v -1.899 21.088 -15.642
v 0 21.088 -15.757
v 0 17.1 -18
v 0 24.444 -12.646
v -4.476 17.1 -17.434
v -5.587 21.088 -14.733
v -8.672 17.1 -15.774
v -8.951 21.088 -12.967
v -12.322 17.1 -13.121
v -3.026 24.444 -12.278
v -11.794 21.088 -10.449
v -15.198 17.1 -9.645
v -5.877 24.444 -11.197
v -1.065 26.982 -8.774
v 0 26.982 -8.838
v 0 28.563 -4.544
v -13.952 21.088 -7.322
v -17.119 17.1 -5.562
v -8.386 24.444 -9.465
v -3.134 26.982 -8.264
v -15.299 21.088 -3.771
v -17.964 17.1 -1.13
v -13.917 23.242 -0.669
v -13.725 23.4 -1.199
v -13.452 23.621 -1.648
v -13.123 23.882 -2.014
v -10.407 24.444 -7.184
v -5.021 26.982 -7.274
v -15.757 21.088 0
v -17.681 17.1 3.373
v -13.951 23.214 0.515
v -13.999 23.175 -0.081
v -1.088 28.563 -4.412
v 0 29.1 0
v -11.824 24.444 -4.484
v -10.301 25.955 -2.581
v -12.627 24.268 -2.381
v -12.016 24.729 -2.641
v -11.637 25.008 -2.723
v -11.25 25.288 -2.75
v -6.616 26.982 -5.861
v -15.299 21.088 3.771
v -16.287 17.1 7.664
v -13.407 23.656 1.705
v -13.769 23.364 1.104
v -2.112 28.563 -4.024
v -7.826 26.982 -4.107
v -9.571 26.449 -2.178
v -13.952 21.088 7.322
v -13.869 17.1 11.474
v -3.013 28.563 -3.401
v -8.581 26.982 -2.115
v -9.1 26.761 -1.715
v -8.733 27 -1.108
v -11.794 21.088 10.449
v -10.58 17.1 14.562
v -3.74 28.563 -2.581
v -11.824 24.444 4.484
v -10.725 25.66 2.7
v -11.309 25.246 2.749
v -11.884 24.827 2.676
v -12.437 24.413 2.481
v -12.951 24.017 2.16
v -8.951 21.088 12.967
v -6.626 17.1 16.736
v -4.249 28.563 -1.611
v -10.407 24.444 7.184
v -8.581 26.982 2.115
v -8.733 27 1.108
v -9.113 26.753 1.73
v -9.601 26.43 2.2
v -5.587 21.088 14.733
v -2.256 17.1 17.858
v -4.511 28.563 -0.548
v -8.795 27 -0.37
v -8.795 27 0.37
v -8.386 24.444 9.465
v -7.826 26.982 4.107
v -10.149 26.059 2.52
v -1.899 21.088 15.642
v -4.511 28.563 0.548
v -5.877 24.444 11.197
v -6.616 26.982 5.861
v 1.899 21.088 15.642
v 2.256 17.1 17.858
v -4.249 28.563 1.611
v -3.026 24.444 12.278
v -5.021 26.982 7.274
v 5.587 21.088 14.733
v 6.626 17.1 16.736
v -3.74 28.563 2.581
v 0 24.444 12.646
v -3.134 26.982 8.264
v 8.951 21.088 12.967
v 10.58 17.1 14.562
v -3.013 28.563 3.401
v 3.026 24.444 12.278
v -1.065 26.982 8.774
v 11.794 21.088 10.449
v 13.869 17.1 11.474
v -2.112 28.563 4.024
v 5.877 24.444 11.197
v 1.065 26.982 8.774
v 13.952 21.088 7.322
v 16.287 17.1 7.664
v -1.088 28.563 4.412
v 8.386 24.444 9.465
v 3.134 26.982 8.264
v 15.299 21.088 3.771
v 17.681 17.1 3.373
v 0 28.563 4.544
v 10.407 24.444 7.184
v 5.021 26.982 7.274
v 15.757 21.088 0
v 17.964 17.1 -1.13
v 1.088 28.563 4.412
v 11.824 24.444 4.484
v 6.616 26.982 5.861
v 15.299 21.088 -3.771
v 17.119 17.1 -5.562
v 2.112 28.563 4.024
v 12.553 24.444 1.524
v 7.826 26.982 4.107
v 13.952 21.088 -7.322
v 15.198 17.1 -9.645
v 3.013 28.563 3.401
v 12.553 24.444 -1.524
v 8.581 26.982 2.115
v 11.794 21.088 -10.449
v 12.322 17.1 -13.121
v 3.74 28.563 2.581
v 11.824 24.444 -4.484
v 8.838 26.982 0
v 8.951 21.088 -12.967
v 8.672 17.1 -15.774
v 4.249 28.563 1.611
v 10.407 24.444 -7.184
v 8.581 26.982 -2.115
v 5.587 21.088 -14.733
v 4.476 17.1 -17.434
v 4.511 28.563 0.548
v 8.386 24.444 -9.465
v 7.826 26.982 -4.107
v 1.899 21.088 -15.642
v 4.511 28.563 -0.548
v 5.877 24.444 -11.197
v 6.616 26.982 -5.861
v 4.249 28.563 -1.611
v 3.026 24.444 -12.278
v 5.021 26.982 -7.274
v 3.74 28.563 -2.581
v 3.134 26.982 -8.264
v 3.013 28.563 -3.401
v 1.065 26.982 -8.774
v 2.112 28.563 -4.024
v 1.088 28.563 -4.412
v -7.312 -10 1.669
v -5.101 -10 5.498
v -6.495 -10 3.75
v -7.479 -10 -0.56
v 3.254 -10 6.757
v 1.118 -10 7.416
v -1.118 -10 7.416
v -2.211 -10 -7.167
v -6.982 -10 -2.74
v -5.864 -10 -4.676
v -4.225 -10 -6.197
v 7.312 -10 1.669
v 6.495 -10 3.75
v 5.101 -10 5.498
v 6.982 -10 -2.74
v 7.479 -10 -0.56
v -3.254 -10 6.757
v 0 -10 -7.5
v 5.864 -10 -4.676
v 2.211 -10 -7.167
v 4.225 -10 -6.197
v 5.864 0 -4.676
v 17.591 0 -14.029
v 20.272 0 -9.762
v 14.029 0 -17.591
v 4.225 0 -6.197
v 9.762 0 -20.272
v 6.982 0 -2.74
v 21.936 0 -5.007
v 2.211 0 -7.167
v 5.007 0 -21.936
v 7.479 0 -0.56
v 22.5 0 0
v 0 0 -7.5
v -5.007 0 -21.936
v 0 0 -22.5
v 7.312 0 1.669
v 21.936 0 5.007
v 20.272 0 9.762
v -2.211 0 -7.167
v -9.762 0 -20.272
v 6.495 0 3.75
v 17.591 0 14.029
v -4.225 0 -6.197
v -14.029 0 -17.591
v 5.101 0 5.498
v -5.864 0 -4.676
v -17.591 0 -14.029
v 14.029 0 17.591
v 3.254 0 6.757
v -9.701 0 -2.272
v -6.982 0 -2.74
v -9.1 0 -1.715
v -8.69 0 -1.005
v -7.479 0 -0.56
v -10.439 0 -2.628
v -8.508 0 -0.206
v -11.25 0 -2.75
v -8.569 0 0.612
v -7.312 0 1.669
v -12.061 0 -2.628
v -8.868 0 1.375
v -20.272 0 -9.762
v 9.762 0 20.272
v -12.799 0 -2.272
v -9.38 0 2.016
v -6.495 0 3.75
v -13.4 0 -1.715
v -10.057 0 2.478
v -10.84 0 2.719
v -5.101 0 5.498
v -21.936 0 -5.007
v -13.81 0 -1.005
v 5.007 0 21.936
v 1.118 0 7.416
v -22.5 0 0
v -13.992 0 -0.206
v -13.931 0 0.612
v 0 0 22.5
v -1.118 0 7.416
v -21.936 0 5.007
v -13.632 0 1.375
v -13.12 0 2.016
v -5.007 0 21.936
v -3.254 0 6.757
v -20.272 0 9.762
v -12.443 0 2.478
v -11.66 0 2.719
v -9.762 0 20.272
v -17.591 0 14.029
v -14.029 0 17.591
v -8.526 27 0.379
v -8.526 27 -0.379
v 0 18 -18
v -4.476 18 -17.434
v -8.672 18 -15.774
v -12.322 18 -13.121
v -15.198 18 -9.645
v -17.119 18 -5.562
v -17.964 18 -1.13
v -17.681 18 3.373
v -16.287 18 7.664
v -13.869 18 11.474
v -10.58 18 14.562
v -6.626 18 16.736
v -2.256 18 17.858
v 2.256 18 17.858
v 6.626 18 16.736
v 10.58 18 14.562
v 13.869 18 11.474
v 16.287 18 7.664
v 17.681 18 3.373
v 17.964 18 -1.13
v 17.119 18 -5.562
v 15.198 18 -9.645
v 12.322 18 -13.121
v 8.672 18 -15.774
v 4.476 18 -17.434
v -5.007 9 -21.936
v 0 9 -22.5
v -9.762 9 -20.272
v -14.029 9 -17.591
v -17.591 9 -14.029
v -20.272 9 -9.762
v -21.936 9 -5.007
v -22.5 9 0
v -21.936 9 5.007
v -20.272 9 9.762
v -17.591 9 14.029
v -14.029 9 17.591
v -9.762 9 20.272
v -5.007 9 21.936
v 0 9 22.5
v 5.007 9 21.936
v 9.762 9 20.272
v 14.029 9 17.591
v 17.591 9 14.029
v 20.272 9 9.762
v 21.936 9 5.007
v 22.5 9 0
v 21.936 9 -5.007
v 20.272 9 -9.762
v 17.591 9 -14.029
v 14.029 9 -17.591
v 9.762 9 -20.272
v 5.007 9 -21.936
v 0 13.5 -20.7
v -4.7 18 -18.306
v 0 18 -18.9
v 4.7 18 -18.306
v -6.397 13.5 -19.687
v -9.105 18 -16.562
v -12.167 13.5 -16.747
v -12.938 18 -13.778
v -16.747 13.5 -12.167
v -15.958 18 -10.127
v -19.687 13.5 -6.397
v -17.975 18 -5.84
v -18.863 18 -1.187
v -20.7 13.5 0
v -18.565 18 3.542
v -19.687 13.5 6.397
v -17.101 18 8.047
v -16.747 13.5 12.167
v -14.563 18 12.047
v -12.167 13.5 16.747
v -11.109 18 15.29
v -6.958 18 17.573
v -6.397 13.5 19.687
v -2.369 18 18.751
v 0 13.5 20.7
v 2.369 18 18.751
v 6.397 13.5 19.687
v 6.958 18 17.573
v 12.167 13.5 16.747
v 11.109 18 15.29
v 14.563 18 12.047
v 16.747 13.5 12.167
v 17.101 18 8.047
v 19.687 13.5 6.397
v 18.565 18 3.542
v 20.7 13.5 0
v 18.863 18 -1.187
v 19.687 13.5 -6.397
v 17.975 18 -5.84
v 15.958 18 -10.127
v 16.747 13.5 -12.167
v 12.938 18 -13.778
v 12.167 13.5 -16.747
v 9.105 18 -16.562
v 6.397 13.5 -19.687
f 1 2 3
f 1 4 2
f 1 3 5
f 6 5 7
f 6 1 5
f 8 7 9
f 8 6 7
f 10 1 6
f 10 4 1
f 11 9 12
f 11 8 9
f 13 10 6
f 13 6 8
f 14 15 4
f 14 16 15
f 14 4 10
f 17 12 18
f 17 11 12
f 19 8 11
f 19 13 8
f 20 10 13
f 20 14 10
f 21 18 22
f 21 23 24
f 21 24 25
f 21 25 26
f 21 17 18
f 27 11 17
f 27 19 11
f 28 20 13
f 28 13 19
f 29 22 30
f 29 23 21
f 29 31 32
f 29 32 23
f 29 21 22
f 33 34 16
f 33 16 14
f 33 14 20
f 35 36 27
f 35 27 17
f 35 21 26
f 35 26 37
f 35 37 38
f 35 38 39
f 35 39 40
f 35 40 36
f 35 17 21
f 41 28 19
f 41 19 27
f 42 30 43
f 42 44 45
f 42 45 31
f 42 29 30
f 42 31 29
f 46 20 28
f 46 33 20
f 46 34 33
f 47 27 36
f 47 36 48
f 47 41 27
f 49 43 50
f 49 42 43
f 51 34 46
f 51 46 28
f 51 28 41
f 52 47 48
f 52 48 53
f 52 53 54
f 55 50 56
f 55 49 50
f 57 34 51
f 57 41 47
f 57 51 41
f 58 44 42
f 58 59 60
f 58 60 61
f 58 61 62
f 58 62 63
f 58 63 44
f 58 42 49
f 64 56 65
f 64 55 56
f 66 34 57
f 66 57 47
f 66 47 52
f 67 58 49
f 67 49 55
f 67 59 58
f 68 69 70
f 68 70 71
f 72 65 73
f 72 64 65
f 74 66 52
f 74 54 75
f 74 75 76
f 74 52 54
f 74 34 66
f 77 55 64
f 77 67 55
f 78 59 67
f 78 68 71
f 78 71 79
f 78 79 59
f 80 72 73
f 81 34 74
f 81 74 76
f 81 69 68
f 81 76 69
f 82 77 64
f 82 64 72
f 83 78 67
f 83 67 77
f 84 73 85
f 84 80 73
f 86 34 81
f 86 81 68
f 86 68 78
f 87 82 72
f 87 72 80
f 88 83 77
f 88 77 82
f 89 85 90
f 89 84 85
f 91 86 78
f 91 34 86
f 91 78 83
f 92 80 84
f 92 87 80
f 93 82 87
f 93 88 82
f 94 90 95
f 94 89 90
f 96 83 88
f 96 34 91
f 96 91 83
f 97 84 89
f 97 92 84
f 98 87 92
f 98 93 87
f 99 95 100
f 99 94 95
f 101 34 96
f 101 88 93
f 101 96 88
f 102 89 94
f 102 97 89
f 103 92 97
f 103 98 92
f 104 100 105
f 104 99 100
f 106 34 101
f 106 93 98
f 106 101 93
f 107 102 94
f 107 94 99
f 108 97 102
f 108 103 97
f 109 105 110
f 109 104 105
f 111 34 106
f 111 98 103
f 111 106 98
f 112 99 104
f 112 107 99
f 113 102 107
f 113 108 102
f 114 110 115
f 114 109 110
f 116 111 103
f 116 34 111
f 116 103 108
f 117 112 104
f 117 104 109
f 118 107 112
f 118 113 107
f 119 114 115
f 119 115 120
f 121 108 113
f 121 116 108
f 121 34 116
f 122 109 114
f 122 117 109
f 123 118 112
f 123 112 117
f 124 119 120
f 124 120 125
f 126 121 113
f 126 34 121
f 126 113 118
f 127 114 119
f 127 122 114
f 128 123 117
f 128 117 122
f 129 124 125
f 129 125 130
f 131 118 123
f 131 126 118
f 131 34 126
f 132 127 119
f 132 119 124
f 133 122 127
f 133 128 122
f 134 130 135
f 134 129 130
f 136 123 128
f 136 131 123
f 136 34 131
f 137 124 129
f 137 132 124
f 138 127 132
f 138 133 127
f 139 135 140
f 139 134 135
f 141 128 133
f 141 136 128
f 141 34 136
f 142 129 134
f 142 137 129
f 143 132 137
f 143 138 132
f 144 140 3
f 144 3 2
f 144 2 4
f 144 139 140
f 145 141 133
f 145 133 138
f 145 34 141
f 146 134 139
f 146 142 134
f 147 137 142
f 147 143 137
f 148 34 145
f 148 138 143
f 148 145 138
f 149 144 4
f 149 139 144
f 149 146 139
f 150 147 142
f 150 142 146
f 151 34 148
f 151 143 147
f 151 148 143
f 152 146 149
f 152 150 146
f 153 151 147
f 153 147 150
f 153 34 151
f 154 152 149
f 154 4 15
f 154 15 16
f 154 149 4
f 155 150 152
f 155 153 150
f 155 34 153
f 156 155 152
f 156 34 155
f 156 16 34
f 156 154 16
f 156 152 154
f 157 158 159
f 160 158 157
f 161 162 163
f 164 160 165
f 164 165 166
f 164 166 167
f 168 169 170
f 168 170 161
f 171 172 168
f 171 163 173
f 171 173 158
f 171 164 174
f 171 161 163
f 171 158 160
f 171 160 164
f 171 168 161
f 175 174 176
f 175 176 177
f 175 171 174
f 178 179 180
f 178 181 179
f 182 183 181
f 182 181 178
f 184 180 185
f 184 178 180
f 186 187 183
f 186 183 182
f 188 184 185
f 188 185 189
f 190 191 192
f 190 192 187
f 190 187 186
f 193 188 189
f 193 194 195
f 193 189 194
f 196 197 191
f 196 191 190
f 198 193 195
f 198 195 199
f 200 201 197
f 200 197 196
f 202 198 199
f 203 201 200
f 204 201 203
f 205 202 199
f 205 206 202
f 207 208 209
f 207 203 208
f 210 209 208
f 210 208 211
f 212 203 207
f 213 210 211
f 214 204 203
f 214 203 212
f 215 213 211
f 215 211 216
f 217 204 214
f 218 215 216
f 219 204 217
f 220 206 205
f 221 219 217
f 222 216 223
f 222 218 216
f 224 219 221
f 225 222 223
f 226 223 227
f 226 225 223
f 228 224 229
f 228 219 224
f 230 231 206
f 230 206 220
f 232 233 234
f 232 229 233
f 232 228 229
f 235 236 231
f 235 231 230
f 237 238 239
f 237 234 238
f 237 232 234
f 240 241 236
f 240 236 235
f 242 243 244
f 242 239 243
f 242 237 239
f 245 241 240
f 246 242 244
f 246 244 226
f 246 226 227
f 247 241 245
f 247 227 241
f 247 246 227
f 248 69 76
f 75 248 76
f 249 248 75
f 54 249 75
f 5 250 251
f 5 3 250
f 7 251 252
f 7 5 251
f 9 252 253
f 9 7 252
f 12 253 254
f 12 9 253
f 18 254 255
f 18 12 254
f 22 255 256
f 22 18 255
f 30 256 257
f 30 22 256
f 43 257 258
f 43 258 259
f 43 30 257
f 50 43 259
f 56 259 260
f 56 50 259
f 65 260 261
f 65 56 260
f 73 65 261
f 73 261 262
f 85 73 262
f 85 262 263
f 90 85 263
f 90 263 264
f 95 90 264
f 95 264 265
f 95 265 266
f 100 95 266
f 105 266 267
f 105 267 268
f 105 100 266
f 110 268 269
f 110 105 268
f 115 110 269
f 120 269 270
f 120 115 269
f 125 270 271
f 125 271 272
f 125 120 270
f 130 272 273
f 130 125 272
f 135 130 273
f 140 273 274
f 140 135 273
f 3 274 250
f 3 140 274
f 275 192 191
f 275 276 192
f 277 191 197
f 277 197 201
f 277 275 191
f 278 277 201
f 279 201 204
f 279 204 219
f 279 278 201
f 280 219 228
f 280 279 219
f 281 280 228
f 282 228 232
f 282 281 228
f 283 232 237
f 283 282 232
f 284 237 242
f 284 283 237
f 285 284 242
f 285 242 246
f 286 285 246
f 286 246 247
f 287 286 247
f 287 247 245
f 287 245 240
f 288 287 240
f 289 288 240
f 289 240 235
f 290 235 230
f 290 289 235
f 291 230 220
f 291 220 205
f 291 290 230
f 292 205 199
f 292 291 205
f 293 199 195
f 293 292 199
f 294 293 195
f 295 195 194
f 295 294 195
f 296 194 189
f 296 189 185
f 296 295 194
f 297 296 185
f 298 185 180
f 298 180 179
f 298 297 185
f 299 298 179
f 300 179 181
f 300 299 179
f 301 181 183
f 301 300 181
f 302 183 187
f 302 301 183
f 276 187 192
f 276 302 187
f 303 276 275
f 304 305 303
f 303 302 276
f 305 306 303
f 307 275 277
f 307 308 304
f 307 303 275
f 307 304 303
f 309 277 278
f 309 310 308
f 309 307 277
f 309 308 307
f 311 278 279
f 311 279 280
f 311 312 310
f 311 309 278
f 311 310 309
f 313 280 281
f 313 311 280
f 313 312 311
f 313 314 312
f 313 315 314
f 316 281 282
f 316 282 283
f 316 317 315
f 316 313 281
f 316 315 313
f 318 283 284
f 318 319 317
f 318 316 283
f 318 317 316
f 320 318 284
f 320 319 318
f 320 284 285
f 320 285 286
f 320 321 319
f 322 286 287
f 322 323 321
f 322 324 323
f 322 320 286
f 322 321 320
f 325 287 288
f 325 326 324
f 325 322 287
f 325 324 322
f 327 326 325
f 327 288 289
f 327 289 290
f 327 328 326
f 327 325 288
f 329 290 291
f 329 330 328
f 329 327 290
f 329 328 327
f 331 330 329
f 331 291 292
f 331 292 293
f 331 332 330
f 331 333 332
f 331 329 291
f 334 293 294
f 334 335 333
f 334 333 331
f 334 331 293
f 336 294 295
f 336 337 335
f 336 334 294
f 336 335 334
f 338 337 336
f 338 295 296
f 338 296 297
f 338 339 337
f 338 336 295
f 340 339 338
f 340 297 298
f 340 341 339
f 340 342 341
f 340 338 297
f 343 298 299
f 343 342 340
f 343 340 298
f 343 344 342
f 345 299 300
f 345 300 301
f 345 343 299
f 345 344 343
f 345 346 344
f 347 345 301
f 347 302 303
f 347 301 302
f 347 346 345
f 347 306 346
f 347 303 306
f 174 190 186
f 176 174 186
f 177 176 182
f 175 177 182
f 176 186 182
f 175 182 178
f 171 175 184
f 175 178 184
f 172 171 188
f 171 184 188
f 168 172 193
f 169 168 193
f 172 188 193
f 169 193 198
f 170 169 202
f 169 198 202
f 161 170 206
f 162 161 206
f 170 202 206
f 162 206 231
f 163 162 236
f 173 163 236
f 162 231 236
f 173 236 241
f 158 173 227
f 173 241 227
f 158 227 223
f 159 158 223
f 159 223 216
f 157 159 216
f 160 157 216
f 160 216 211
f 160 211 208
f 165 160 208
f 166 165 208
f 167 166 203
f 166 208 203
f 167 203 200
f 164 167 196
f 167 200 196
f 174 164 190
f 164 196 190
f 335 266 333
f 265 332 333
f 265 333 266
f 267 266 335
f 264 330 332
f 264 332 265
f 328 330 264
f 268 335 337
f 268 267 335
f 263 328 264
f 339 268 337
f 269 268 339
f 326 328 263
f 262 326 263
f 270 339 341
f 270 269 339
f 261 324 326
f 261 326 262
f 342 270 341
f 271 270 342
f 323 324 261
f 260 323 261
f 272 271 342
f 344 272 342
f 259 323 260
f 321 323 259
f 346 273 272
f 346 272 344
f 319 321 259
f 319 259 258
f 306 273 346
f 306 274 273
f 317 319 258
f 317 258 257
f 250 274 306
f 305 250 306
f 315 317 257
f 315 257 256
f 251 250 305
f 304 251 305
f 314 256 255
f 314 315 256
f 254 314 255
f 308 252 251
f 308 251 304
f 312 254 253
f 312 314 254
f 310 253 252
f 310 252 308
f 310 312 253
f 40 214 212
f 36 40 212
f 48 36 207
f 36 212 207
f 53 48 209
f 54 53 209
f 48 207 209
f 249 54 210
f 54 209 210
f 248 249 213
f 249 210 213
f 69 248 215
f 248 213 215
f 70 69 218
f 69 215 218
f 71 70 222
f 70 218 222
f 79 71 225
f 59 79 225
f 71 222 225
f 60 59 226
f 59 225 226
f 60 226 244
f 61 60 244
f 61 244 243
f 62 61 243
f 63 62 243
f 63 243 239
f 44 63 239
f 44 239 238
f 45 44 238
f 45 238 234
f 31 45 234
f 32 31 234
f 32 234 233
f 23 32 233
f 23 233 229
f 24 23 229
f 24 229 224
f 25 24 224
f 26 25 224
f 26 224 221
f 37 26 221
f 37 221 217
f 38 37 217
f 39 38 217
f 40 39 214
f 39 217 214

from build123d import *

# Parameters (mm, degrees)
ECHELLE1_SCALE          = 0.6
ESQUISSE3_R             = 7.5
BOSS_EXTRU_1_DEPTH      = 10
ESQUISSE4_R             = 2.75
ENL_V_MAT_EXTRU_1_DEPTH = 27


with BuildPart() as part:
    # Esquisse2 → Révolution1 (revolve)
    with BuildSketch(Plane.XY, mode=Mode.PRIVATE) as r_volution1_sk:
        with BuildLine():
            Line((0, 0), (37.5, 0))
            Line((37.5, 0), (37.5, 15))
            Line((37.5, 15), (31.5, 30))
            Line((31.5, 30), (30, 30))
            Line((30, 30), (30, 28.5))
            ThreePointArc((30, 28.5), (18.027756377, 43.041634566), (0, 48.5))
            Line((0, 48.5), (0, 0))
        make_face()
    revolve(r_volution1_sk.sketch.rotate(Axis((0, 0, 0), (0, 1, 0)), 90), axis=Axis((0, 0, 0), (0, 1, 0)))


with BuildPart() as part_1:
    # Echelle1: scaled about (0, 0, 0)
    add(part.part.scale(ECHELLE1_SCALE))

    # Esquisse3 → Boss.-Extru.1 (add)
    with BuildSketch(Plane(origin=(0, 0, 0), x_dir=(-1, 0, 0), z_dir=(0, -1, 0))):
        with Locations(Location((0, 0, 0), (0, 0, 90))):
            Circle(ESQUISSE3_R)
    extrude(amount=BOSS_EXTRU_1_DEPTH)

    # Esquisse4 → Enlèv. mat.-Extru.1 (cut)
    with BuildSketch(Plane(origin=(0, 0, 0), x_dir=(-1, 0, 0), z_dir=(0, -1, 0))):
        with Locations(Location((11.25, 0, 0), (0, 0, 90))):
            Circle(ESQUISSE4_R)
    extrude(amount=-ENL_V_MAT_EXTRU_1_DEPTH, mode=Mode.SUBTRACT)


solid = part_1.part
